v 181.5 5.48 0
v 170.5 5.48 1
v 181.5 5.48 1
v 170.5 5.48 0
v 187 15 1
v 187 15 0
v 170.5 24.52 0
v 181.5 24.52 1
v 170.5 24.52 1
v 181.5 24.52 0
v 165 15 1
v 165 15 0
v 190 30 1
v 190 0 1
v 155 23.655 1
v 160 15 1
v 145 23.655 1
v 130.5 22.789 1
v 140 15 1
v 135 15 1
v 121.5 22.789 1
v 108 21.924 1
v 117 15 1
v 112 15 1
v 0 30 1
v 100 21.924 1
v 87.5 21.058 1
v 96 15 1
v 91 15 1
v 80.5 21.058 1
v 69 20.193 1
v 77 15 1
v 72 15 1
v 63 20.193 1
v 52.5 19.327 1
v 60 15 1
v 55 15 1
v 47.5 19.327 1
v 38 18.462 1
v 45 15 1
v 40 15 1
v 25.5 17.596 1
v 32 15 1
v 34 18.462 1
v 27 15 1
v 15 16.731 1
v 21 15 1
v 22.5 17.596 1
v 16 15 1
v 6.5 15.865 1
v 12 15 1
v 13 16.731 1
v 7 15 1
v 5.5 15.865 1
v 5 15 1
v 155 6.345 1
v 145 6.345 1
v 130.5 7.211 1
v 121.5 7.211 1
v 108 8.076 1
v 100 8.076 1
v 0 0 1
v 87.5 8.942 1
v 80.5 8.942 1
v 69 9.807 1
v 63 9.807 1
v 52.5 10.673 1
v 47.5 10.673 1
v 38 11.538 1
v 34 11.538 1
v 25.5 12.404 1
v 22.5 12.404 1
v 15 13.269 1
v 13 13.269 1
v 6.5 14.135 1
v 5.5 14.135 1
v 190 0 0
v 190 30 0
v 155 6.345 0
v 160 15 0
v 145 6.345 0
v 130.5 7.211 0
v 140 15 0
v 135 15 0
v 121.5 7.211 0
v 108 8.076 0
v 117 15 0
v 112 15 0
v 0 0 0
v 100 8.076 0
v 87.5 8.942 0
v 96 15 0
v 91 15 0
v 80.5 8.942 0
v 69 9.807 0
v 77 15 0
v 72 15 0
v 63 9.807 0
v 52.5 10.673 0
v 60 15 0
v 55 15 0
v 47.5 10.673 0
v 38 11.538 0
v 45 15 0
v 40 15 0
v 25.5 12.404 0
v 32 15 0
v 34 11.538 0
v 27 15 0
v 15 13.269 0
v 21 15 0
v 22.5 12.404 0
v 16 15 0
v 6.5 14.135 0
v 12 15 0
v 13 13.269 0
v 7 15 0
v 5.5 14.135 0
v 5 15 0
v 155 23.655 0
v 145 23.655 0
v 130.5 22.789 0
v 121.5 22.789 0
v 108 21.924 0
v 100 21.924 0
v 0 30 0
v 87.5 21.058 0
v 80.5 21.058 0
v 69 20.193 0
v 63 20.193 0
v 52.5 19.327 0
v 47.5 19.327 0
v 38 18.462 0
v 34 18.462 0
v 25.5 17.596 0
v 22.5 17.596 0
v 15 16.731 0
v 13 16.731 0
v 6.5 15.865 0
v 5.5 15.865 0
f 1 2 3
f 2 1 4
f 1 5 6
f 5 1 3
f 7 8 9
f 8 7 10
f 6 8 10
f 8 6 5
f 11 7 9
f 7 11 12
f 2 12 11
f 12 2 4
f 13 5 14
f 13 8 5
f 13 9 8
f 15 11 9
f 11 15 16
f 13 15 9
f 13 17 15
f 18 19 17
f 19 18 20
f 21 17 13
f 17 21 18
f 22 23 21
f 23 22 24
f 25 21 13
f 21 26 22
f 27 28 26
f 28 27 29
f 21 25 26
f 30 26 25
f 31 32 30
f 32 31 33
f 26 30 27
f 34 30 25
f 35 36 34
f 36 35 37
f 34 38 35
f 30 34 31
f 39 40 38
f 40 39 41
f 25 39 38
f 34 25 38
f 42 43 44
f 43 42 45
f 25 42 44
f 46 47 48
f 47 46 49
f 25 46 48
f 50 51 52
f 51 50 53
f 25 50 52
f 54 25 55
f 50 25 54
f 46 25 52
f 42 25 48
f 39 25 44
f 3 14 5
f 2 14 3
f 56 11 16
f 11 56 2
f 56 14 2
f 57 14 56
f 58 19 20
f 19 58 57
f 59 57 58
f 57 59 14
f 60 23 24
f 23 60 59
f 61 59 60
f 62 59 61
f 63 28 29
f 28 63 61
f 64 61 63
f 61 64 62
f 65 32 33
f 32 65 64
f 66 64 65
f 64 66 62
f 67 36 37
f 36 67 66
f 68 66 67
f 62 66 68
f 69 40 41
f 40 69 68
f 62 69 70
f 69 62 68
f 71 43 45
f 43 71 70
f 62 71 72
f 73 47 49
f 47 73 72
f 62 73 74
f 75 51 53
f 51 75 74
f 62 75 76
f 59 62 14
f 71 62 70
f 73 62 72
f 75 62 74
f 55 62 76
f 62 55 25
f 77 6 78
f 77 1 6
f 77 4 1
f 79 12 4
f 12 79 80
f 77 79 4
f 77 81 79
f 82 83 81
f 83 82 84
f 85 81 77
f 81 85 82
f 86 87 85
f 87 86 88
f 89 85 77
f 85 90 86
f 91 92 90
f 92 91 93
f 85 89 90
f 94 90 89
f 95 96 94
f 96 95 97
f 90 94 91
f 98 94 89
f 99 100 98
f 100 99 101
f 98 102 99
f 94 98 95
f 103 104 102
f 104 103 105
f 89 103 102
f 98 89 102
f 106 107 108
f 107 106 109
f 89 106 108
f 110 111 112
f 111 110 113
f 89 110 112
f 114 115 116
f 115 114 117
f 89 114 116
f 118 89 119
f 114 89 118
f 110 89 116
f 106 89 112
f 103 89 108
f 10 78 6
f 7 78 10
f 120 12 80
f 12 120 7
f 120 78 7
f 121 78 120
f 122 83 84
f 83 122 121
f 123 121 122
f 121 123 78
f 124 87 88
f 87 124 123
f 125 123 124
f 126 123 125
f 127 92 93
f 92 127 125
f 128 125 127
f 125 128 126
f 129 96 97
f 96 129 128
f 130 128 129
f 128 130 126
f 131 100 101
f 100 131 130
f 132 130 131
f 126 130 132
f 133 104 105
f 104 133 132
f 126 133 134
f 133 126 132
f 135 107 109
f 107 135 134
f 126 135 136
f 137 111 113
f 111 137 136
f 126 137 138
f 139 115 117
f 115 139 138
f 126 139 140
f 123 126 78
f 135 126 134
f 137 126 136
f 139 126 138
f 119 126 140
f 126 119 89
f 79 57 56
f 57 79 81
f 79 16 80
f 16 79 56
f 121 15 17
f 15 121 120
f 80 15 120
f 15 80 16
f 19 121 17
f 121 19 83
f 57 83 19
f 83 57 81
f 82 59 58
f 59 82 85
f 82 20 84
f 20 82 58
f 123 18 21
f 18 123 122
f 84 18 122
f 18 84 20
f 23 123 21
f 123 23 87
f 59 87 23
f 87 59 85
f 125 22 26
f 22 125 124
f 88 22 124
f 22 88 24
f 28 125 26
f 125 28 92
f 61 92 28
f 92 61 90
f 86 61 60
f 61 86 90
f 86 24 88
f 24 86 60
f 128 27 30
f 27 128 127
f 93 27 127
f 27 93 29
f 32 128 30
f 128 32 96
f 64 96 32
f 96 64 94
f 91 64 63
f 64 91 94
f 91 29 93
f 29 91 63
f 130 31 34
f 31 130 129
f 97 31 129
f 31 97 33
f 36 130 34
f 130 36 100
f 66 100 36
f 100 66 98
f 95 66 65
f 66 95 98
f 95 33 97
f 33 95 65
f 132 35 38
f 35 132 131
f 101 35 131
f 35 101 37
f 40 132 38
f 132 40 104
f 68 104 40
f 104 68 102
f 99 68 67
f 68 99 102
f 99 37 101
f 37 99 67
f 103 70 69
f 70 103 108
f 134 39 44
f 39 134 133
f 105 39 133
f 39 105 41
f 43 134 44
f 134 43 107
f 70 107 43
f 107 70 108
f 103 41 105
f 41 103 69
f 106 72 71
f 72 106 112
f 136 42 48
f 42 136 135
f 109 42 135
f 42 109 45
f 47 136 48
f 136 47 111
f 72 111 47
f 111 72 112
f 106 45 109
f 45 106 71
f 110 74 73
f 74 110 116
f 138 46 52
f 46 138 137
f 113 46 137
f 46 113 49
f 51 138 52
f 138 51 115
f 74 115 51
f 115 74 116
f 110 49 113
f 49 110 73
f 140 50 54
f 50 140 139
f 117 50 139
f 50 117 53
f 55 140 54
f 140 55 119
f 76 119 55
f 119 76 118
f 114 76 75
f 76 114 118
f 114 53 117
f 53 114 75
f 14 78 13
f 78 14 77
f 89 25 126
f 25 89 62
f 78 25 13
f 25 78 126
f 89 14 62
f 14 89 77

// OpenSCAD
difference() {
  translate([95.0000000000, 15.0000000000, 0.5000000000]) {
    scale([190.0000000000, 30.0000000000, 1.0000000000]) {
      translate([-0.5000000000, -0.5000000000, -0.5000000000]) {
        cube([1, 1, 1]);
      }
    }
  }
  union() {
    union() {
      union() {
        union() {
          union() {
            union() {
              union() {
                union() {
                  union() {
                    union() {
                      translate([176.0000000000, 15.0000111140, 0.5000000000]) {
                        scale([22.0000000000, 19.0520000000, 1.0000000000]) {
                          rotate([0.0000000000, 0.0000000000, -0.0000000000]) {
                            scale([0.5, 0.577, 1]) cylinder($fn = 6, center = true);
                          }
                        }
                      }
                      translate([150.0000000000, 14.9999946600, 0.5000000000]) {
                        scale([20.0000000000, 17.3200000000, 1.0000000000]) {
                          rotate([0.0000000000, 0.0000000000, -0.0000000000]) {
                            scale([0.5, 0.577, 1]) cylinder($fn = 6, center = true);
                          }
                        }
                      }
                    }
                    translate([126.0000000000, 15.0000128460, 0.5000000000]) {
                      scale([18.0000000000, 15.5880000000, 1.0000000000]) {
                        rotate([0.0000000000, 0.0000000000, -0.0000000000]) {
                          scale([0.5, 0.577, 1]) cylinder($fn = 6, center = true);
                        }
                      }
                    }
                  }
                  translate([104.0000000000, 15.0000000000, 0.5000000000]) {
                    scale([16.0000000000, 13.8560000000, 1.0000000000]) {
                      rotate([0.0000000000, 0.0000000000, -0.0000000000]) {
                        scale([0.5, 0.577, 1]) cylinder($fn = 6, center = true);
                      }
                    }
                  }
                }
                translate([84.0000000000, 15.0000000000, 0.5000000000]) {
                  scale([14.0000000000, 12.1240000000, 1.0000000000]) {
                    rotate([0.0000000000, 0.0000000000, -0.0000000000]) {
                      scale([0.5, 0.577, 1]) cylinder($fn = 6, center = true);
                    }
                  }
                }
              }
              translate([66.0000000000, 15.0000000000, 0.5000000000]) {
                scale([12.0000000000, 10.3920000000, 1.0000000000]) {
                  rotate([0.0000000000, 0.0000000000, -0.0000000000]) {
                    scale([0.5, 0.577, 1]) cylinder($fn = 6, center = true);
                  }
                }
              }
            }
            translate([50.0000000000, 15.0000000000, 0.5000000000]) {
              scale([10.0000000000, 8.6600000000, 1.0000000000]) {
                rotate([0.0000000000, 0.0000000000, -0.0000000000]) {
                  scale([0.5, 0.577, 1]) cylinder($fn = 6, center = true);
                }
              }
            }
          }
          translate([36.0000000000, 15.0000000000, 0.5000000000]) {
            scale([8.0000000000, 6.9280000000, 1.0000000000]) {
              rotate([0.0000000000, 0.0000000000, -0.0000000000]) {
                scale([0.5, 0.577, 1]) cylinder($fn = 6, center = true);
              }
            }
          }
        }
        translate([24.0000000000, 15.0000000000, 0.5000000000]) {
          scale([6.0000000000, 5.1960000000, 1.0000000000]) {
            rotate([0.0000000000, 0.0000000000, -0.0000000000]) {
              scale([0.5, 0.577, 1]) cylinder($fn = 6, center = true);
            }
          }
        }
      }
      translate([14.0000000000, 15.0000000000, 0.5000000000]) {
        scale([4.0000000000, 3.4640000000, 1.0000000000]) {
          rotate([0.0000000000, 0.0000000000, -0.0000000000]) {
            scale([0.5, 0.577, 1]) cylinder($fn = 6, center = true);
          }
        }
      }
    }
    translate([6.0000000000, 15.0000000000, 0.5000000000]) {
      scale([2.0000000000, 1.7320000000, 1.0000000000]) {
        rotate([0.0000000000, 0.0000000000, -0.0000000000]) {
          scale([0.5, 0.577, 1]) cylinder($fn = 6, center = true);
        }
      }
    }
  }
}
